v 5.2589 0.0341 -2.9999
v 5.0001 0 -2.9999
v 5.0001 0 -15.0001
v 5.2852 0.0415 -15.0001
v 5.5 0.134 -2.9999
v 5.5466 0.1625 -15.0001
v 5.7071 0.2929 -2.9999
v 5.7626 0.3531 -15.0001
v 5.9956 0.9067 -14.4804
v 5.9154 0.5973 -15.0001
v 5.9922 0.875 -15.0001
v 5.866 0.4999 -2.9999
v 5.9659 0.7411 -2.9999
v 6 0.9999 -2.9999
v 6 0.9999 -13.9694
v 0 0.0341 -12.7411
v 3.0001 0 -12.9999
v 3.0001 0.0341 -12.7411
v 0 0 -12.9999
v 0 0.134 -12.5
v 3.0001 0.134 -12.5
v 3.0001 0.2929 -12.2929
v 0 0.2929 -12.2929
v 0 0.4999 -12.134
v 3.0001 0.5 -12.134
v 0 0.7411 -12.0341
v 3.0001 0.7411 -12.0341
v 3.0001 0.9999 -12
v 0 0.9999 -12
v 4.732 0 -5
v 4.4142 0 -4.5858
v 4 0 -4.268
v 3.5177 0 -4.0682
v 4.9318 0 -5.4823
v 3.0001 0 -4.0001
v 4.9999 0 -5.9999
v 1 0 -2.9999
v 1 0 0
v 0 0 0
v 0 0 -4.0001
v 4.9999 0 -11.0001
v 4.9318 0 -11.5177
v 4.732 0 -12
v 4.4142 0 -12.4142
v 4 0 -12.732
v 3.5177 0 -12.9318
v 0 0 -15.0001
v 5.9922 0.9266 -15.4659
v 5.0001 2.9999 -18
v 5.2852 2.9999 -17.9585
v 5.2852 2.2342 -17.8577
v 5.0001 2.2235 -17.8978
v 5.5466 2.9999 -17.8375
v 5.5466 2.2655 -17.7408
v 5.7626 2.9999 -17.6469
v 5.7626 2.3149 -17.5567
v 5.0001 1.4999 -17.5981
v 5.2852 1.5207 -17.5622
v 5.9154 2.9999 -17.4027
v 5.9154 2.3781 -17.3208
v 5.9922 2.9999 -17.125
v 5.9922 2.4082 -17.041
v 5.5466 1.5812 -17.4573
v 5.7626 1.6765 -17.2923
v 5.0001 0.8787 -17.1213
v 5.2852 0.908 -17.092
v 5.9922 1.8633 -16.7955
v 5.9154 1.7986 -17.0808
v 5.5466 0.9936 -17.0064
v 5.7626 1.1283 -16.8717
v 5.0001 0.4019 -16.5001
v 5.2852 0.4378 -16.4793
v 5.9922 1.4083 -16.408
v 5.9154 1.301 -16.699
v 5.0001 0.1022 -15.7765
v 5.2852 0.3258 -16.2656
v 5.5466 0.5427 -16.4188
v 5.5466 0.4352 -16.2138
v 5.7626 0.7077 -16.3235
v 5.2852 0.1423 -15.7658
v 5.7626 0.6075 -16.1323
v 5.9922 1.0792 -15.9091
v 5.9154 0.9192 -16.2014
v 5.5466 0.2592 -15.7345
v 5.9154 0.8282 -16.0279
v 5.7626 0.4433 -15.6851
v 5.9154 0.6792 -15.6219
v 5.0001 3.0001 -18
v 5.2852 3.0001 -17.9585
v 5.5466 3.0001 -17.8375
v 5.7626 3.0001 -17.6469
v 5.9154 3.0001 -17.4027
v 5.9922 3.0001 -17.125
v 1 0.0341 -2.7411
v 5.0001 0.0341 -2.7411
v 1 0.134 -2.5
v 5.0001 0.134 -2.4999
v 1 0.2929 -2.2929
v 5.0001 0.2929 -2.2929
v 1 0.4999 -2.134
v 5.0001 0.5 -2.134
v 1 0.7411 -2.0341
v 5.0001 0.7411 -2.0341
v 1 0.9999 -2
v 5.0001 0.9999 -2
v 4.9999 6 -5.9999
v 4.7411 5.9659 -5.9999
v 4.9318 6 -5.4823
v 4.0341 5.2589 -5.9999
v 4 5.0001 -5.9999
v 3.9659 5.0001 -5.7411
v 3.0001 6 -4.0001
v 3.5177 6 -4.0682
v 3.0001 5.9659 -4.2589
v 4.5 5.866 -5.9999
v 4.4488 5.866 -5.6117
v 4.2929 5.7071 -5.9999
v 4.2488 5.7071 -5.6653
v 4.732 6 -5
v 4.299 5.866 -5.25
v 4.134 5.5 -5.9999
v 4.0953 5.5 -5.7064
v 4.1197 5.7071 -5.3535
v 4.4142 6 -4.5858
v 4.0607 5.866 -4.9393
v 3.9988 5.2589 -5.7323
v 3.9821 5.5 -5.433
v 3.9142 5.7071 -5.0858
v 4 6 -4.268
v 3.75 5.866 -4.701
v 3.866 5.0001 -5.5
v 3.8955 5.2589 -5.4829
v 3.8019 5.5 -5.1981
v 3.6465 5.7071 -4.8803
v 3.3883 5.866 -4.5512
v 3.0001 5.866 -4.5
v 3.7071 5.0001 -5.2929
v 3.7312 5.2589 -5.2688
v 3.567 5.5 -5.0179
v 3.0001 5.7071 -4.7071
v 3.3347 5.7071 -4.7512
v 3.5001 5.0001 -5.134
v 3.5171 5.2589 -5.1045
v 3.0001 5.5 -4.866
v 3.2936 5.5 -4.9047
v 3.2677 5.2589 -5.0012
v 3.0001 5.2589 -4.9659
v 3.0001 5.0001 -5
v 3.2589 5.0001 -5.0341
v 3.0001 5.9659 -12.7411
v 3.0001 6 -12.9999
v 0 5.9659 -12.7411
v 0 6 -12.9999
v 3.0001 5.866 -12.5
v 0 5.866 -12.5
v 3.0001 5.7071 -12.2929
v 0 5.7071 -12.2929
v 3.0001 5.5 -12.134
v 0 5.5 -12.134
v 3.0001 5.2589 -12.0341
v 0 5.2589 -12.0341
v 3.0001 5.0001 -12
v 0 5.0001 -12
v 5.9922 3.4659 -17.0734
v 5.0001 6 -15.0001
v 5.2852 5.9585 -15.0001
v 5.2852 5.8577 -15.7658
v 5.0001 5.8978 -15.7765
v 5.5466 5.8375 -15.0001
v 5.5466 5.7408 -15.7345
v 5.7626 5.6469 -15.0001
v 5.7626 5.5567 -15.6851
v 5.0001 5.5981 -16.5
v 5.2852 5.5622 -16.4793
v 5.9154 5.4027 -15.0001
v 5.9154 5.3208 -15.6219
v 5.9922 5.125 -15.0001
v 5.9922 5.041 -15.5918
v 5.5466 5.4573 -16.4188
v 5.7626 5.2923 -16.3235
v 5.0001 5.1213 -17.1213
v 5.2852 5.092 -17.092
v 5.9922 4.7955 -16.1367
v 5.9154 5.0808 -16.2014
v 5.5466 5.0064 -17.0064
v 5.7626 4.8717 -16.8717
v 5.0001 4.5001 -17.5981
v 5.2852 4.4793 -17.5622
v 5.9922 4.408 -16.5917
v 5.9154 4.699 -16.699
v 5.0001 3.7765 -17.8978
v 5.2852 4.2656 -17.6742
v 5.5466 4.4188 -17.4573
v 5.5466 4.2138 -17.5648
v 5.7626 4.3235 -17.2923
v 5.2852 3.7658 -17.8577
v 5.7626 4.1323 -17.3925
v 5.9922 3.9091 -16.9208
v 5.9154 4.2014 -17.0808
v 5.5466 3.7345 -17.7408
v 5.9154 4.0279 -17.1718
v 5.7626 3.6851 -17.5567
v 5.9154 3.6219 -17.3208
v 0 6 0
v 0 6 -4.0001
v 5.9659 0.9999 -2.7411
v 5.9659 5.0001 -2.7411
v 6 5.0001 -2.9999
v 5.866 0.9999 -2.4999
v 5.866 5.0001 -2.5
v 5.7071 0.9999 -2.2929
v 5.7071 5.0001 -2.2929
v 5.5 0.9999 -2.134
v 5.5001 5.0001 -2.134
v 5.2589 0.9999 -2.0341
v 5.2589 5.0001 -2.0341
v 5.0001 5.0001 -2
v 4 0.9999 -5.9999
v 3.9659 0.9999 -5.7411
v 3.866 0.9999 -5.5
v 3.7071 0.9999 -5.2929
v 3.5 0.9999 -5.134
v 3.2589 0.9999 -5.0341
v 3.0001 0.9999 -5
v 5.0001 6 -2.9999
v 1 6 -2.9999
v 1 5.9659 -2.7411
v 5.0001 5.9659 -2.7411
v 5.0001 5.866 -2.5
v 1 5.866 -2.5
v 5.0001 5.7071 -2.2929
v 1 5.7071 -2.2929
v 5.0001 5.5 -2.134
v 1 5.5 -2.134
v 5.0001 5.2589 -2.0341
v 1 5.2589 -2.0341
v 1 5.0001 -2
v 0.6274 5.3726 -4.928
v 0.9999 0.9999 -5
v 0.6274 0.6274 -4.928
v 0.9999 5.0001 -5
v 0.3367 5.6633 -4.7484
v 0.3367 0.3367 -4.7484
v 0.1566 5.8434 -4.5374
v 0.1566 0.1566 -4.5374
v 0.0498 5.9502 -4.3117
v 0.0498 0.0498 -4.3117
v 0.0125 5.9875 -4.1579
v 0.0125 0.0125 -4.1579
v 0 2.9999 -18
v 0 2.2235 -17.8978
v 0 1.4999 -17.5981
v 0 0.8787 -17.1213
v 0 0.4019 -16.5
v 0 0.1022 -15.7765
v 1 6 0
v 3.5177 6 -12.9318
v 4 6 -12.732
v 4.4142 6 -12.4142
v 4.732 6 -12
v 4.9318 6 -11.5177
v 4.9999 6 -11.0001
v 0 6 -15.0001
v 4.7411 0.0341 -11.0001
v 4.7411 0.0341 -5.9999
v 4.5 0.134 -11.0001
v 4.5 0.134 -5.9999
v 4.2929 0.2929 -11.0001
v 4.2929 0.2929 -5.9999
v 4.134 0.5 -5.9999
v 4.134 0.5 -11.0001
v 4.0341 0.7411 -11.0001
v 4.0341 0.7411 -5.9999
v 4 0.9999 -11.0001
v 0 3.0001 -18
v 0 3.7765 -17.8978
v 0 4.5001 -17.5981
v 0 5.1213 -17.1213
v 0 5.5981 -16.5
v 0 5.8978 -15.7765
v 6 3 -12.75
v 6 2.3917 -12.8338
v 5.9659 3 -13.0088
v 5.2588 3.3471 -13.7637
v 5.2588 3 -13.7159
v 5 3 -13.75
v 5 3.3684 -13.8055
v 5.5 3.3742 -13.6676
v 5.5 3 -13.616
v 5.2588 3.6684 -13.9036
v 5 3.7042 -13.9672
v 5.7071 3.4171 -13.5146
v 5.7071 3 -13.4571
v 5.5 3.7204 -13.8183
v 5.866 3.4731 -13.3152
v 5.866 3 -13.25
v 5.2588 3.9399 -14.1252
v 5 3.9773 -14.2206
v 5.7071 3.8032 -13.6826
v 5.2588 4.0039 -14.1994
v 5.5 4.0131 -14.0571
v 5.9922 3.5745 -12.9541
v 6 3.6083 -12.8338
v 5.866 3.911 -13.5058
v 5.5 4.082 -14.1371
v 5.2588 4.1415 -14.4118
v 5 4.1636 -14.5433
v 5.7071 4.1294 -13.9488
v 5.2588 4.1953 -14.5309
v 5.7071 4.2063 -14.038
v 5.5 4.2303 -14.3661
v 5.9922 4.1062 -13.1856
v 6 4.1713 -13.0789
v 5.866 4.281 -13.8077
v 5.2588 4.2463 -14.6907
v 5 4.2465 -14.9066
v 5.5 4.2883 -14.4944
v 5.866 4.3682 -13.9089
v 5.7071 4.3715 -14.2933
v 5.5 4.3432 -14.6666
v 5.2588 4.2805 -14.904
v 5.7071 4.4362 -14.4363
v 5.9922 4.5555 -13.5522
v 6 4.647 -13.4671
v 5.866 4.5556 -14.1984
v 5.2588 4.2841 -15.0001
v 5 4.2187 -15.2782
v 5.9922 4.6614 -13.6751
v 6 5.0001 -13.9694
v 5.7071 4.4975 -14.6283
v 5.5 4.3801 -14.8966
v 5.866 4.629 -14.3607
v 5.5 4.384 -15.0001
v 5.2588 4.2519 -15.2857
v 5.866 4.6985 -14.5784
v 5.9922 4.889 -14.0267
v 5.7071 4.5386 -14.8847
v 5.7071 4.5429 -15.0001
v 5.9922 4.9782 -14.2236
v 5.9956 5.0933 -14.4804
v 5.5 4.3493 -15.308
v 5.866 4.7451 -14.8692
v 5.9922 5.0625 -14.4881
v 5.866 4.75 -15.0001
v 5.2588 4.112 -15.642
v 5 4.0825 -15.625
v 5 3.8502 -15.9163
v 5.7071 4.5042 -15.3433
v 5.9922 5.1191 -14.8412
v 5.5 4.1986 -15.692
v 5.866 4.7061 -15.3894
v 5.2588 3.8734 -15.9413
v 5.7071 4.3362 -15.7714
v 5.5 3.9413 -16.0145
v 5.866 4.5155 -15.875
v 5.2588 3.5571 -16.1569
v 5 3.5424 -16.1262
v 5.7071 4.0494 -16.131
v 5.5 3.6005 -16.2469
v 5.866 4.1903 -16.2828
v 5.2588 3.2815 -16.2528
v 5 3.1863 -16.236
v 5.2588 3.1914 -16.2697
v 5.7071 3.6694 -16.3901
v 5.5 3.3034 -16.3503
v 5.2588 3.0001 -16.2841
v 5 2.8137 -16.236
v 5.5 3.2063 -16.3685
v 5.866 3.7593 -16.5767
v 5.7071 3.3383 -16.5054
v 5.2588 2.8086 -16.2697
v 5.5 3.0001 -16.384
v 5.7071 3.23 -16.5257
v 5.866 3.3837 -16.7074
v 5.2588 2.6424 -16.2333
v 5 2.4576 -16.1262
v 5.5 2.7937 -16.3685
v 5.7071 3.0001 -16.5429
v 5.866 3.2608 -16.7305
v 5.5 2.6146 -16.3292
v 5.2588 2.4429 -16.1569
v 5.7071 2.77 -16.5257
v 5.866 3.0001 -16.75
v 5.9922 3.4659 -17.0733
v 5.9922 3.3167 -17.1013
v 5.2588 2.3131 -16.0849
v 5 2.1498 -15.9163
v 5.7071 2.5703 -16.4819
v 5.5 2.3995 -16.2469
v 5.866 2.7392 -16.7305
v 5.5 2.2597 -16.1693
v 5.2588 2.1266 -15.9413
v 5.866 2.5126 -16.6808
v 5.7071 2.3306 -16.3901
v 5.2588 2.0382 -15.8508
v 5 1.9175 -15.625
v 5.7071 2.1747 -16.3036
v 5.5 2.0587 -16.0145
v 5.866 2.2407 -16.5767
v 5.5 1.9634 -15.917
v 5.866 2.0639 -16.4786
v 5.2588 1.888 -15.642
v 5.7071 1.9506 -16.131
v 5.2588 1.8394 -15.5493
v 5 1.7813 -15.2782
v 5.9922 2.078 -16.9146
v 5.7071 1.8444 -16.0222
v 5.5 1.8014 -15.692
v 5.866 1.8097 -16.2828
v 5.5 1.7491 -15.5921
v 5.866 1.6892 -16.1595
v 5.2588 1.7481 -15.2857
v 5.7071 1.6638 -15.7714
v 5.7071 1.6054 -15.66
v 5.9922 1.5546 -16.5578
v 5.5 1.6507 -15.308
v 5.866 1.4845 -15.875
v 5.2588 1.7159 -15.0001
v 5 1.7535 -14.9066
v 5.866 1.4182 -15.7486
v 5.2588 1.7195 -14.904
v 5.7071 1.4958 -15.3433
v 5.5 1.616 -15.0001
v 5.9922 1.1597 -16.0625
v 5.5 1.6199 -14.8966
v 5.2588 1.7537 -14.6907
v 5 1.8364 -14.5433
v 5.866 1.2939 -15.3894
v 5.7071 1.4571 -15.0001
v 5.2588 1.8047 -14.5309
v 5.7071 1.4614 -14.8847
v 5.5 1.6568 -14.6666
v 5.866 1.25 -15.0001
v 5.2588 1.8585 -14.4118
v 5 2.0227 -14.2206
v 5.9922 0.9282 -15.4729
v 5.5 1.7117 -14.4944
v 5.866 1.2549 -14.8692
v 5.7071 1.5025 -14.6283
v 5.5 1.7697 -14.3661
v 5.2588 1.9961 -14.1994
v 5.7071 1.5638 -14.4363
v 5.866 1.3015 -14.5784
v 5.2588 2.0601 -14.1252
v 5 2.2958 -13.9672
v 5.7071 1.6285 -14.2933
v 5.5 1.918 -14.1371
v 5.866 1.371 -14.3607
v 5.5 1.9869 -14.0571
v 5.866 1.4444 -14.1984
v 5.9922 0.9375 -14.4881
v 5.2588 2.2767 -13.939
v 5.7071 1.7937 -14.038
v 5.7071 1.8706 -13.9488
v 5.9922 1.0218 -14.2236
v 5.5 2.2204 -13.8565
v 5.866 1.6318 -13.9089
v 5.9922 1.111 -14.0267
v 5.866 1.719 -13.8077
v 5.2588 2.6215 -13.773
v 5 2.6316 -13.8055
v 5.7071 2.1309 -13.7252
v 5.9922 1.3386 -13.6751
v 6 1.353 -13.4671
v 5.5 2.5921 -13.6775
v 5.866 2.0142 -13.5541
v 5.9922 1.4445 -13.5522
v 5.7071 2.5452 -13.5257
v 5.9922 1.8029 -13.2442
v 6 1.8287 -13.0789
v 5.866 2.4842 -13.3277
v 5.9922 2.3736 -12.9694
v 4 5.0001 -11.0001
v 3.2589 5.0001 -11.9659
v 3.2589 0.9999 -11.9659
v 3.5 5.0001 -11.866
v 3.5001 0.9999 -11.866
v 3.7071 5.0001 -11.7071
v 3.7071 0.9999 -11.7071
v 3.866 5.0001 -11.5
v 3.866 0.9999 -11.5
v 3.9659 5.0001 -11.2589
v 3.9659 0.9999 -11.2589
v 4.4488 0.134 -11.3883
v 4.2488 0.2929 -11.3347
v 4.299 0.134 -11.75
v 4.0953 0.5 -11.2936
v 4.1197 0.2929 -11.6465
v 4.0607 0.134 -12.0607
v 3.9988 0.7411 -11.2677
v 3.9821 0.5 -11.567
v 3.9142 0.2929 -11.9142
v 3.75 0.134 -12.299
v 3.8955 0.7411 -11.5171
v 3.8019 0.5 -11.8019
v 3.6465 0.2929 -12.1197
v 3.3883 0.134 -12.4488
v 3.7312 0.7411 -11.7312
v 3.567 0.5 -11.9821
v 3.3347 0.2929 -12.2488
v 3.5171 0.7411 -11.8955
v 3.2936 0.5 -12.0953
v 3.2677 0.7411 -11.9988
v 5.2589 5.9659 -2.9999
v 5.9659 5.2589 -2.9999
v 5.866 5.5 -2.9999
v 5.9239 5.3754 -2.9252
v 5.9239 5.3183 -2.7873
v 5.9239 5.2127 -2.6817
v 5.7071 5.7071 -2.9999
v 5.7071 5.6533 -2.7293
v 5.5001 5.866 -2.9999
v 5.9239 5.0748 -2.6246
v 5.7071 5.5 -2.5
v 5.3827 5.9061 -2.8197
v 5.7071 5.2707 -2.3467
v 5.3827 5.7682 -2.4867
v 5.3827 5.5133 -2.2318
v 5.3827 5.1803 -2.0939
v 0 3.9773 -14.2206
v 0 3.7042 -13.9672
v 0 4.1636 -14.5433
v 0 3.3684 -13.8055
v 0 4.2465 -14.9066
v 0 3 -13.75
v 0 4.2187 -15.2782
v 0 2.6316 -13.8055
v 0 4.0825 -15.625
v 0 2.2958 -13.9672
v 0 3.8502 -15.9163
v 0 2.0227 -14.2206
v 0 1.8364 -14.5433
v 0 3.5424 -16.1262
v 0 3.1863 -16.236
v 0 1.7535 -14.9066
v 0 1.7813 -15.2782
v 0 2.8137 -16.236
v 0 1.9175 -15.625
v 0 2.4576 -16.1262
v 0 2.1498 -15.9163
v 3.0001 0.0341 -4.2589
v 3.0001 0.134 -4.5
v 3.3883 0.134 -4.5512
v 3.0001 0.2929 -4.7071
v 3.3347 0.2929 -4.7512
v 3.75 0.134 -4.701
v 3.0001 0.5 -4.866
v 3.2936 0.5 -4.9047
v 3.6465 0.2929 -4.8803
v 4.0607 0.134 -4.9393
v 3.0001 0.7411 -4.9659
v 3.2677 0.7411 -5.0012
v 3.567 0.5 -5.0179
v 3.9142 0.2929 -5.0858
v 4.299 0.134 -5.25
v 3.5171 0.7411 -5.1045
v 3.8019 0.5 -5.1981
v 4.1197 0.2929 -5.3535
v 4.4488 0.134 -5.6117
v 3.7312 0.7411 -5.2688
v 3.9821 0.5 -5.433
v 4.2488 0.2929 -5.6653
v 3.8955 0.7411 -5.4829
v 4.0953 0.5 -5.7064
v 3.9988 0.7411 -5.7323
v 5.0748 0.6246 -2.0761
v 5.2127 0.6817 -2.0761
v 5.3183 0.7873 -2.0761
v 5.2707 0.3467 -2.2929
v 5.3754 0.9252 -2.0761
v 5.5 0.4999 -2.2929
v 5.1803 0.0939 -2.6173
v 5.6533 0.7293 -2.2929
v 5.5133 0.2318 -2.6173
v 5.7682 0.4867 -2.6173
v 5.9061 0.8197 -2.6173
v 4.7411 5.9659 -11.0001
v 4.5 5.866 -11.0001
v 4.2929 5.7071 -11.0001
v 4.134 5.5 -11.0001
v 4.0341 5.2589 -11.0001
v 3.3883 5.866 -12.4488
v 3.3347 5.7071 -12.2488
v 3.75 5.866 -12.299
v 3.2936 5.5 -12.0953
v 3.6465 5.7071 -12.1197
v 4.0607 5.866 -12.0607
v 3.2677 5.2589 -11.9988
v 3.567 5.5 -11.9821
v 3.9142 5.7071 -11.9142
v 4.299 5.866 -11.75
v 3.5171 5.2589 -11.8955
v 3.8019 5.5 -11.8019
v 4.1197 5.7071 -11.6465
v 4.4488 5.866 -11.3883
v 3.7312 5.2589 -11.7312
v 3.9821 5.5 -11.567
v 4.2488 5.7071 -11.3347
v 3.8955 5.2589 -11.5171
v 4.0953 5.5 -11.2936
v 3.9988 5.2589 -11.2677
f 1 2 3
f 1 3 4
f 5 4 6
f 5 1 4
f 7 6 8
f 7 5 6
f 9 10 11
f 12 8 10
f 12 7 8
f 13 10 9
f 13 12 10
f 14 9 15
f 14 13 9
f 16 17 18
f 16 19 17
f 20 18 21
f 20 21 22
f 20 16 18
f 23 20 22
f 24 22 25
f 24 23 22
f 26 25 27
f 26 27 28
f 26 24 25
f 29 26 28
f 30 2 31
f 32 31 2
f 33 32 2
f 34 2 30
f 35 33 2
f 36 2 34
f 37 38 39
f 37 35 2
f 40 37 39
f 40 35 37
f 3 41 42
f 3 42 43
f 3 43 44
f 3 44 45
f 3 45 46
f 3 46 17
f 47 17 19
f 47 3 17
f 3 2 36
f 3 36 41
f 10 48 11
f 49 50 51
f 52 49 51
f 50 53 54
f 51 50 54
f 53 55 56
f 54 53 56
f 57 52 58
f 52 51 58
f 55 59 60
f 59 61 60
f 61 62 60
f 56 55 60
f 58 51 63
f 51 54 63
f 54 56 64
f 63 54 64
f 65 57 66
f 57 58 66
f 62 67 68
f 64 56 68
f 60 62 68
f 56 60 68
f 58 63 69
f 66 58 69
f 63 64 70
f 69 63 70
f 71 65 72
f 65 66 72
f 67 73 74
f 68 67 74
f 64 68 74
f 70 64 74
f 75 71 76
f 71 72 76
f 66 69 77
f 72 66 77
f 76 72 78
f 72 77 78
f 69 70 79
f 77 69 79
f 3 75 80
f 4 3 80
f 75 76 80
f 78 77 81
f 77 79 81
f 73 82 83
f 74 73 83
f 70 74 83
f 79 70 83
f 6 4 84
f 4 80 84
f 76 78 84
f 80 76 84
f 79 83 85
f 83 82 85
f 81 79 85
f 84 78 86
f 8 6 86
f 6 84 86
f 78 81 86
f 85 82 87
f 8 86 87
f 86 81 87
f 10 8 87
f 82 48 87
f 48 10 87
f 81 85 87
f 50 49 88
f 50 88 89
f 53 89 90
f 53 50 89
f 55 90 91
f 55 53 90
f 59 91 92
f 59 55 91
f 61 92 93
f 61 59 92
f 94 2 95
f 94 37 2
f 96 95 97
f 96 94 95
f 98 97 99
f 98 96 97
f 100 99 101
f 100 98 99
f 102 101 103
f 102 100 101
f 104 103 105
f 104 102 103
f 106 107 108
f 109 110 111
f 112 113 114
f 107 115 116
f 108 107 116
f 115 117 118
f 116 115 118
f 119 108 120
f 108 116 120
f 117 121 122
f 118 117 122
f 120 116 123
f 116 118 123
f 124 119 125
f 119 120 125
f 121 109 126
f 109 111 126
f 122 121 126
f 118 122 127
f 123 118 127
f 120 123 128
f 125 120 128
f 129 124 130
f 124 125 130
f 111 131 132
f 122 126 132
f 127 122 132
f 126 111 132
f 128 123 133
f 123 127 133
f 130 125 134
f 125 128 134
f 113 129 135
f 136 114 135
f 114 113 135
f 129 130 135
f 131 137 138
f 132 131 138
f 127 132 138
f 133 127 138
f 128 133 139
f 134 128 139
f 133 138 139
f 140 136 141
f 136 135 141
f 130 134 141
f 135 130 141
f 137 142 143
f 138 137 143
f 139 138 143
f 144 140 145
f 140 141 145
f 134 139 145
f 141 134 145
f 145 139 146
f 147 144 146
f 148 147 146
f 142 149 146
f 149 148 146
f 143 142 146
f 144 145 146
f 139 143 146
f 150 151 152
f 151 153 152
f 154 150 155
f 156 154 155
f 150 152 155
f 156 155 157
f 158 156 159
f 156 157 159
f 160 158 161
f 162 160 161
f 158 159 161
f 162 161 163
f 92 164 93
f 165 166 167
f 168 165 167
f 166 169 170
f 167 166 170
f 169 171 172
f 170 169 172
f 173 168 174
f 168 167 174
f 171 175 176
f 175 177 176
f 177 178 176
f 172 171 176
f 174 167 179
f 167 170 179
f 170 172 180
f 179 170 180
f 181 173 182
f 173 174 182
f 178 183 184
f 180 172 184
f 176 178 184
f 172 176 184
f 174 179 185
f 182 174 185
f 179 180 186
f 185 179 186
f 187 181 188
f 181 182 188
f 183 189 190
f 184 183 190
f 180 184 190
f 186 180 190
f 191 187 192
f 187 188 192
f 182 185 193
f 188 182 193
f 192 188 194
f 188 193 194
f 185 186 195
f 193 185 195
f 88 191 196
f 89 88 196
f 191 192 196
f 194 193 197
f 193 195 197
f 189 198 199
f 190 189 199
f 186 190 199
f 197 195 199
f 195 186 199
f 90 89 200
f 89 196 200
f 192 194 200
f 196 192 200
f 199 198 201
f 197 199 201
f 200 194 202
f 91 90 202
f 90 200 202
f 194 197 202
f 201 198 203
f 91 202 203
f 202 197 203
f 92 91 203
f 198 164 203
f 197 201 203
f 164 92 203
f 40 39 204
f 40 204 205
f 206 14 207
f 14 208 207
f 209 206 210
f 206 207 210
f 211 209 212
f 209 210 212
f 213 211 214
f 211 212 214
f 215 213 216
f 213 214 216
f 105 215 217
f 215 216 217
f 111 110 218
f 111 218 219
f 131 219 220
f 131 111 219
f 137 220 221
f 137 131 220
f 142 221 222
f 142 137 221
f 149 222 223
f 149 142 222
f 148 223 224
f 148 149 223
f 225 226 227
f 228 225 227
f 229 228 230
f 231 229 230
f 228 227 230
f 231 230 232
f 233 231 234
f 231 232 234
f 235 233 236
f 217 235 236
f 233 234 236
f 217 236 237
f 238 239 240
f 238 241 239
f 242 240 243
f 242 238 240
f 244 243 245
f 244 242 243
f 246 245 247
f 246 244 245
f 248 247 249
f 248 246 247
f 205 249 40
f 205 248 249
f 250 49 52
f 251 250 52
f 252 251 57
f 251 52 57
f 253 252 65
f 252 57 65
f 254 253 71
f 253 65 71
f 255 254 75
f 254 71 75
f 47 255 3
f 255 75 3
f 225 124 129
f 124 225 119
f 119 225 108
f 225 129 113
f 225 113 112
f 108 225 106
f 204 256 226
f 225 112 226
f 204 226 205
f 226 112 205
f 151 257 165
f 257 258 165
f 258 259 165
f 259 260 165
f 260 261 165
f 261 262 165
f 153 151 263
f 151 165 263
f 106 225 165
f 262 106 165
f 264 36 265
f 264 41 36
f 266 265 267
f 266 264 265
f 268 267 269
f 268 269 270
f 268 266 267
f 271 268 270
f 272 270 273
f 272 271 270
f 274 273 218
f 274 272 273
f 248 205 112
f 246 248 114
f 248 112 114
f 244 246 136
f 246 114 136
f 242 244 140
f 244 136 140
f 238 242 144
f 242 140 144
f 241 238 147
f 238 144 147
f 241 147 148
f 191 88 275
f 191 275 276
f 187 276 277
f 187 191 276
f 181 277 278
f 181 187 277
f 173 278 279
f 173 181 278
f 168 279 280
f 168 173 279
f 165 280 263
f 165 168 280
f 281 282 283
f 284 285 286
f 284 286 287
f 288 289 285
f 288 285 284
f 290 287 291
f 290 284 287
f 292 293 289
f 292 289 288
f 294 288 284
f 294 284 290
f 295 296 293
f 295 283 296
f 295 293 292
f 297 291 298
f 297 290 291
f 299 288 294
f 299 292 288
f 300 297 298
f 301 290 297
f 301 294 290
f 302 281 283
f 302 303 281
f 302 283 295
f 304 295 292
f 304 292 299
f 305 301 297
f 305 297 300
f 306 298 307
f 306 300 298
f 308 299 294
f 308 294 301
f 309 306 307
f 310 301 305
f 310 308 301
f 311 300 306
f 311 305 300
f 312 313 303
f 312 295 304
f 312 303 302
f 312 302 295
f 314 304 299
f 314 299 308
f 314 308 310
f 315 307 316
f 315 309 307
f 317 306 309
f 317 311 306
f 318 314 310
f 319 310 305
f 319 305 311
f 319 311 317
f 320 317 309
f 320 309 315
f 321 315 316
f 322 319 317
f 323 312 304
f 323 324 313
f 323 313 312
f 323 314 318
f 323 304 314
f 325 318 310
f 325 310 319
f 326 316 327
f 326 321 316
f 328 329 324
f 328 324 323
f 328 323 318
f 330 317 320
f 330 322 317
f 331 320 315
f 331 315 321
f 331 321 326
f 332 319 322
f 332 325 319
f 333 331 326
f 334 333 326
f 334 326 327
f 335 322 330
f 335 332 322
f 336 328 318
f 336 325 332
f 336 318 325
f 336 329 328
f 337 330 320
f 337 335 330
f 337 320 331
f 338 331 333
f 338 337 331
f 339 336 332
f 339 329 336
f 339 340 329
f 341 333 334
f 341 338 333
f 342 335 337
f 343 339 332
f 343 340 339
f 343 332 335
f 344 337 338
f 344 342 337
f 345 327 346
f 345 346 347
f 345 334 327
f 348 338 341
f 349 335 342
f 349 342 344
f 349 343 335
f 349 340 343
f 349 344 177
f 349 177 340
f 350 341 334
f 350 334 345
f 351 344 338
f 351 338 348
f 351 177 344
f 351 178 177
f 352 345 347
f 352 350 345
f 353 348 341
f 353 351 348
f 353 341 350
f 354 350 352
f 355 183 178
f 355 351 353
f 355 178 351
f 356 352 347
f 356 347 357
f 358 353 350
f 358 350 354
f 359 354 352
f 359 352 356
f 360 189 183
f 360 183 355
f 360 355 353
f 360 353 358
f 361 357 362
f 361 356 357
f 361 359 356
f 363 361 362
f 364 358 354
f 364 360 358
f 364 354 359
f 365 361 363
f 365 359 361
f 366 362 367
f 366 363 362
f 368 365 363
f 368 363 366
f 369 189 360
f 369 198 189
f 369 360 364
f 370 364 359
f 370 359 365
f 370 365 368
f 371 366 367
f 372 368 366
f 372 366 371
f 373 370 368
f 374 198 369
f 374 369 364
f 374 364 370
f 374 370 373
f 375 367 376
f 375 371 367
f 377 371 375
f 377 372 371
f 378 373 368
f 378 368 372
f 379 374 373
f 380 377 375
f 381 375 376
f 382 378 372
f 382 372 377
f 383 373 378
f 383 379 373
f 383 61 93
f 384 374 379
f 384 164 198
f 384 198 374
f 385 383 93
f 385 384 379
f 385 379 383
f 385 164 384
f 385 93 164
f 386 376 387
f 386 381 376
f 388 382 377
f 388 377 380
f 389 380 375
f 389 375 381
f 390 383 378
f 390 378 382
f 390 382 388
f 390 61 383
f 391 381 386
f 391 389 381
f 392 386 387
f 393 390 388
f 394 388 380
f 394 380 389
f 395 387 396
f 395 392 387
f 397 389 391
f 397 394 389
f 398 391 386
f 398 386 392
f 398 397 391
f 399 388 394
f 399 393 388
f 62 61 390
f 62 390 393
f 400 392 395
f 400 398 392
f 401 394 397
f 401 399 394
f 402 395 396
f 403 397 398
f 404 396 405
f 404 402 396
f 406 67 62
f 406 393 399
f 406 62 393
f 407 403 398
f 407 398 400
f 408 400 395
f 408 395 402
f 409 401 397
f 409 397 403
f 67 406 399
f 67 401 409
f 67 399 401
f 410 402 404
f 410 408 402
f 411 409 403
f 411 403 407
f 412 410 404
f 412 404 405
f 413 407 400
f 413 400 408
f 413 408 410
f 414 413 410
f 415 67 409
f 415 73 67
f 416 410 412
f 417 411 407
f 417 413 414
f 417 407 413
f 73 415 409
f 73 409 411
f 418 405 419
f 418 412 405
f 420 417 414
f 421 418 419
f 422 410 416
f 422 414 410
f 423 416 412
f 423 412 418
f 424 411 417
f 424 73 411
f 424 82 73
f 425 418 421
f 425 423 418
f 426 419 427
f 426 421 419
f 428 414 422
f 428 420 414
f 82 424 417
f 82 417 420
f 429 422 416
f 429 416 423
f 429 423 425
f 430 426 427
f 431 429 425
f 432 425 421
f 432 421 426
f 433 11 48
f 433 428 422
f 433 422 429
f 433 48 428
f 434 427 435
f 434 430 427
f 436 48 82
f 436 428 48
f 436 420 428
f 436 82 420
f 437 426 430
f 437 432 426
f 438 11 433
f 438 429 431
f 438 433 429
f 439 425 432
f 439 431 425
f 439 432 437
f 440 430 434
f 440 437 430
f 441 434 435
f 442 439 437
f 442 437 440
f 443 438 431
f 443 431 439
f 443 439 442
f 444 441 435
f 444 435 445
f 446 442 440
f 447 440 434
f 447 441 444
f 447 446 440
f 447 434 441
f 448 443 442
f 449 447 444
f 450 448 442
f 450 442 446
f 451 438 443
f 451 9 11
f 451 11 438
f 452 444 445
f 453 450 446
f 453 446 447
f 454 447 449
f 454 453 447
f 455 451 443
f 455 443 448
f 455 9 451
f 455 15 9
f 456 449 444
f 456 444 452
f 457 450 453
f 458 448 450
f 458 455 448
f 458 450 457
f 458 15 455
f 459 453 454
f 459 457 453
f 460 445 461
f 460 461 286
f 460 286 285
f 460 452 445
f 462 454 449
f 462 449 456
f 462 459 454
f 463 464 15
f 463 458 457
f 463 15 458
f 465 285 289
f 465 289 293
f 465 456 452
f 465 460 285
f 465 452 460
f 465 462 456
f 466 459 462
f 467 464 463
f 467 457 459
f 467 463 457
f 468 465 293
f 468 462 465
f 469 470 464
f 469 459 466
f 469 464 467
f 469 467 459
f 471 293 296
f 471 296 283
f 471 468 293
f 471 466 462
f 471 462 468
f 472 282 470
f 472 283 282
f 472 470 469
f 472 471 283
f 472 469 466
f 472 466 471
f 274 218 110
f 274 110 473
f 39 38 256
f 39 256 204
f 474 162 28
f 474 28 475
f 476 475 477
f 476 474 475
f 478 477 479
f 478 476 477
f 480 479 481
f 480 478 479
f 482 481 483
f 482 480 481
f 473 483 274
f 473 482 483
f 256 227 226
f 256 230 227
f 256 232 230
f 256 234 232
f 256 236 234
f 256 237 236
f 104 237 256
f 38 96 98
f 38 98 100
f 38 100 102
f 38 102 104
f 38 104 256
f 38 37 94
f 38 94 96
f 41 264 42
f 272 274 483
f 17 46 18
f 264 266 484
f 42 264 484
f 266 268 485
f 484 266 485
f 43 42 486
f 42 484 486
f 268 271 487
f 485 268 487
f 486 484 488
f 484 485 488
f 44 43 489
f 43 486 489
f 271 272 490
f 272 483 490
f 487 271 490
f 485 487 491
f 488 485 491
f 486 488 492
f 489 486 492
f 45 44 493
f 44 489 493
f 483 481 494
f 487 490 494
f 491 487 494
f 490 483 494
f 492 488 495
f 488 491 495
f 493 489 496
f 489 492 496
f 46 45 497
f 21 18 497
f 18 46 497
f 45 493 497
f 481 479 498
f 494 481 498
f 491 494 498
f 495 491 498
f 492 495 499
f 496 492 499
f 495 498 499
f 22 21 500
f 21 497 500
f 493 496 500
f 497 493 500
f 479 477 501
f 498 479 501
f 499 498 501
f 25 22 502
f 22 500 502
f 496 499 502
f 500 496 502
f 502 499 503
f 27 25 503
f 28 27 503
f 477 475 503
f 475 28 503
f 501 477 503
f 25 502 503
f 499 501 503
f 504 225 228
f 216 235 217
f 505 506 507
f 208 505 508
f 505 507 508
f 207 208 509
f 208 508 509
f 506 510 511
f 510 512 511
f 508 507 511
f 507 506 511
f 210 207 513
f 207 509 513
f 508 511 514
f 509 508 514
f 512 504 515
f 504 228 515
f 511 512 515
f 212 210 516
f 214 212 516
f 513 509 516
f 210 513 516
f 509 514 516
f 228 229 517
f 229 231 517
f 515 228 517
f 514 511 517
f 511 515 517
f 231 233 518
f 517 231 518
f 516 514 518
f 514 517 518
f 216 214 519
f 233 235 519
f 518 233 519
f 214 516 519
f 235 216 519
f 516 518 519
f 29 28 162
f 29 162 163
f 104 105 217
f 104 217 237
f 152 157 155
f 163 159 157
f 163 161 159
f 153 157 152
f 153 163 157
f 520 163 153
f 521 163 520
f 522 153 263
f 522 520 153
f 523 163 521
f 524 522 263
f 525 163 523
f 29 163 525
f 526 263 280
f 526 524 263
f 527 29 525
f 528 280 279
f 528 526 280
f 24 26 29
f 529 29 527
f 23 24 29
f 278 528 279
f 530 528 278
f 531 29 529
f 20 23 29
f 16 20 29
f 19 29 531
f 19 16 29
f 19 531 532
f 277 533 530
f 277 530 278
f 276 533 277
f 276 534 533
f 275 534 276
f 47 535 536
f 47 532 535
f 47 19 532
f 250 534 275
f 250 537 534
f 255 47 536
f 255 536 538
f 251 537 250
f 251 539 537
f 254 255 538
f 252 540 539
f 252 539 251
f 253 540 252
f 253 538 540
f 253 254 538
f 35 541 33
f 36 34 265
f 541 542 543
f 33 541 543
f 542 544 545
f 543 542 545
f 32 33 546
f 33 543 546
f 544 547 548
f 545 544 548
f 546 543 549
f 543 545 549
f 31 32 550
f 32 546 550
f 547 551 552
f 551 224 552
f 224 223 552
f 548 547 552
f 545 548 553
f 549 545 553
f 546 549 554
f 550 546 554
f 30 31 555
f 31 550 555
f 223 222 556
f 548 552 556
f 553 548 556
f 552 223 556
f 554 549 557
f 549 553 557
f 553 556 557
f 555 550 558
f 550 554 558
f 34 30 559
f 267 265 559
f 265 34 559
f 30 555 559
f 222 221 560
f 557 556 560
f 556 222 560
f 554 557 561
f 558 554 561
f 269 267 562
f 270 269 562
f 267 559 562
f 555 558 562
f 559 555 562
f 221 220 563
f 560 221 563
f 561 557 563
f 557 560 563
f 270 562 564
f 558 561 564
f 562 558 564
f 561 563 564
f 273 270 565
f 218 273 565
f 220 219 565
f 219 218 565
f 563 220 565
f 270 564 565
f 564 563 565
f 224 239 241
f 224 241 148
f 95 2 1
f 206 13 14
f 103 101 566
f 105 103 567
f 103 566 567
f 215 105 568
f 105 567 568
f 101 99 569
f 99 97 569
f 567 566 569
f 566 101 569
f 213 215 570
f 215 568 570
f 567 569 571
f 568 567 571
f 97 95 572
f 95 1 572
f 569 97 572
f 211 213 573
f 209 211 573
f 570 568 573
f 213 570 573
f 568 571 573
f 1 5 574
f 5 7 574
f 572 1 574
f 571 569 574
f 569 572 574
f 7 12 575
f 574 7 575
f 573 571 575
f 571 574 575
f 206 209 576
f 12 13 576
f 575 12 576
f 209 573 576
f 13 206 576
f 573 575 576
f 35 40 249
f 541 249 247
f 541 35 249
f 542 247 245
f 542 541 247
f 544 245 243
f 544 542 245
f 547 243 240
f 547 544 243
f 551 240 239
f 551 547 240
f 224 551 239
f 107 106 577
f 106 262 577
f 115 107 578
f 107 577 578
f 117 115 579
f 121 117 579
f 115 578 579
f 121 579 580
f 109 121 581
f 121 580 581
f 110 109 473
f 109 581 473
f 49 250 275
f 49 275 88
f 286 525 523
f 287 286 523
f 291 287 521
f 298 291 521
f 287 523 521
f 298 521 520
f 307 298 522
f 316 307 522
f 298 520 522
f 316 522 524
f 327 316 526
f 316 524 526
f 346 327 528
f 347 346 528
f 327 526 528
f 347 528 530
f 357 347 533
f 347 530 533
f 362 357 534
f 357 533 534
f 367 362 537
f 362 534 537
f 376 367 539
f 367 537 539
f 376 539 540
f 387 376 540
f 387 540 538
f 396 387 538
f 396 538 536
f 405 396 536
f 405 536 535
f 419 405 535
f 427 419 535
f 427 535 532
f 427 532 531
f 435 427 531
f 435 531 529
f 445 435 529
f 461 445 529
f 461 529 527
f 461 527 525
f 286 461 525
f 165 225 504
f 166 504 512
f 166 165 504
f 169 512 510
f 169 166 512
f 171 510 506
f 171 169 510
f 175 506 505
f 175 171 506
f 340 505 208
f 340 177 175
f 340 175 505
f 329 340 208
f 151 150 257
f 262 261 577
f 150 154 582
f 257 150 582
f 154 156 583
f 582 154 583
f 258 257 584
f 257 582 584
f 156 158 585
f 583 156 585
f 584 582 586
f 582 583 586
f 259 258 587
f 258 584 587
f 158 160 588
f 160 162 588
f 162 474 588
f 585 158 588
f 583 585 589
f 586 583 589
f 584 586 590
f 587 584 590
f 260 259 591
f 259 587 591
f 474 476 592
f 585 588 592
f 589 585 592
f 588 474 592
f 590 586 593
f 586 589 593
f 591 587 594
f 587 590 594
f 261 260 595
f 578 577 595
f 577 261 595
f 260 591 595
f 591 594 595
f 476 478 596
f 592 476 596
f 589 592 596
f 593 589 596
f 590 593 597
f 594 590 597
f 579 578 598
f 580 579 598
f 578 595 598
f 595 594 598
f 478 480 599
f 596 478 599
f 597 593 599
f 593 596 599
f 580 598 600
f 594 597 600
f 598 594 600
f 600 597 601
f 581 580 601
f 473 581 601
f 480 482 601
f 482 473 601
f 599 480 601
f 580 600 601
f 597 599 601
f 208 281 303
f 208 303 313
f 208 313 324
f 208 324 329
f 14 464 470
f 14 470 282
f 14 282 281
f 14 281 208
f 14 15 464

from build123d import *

# Parameters (mm, degrees)
EXTRUDE_1_DEPTH     = 6
FILLET_1_R          = 3
FILLET_2_R          = 1
SKETCH_2_R          = 1.25
CUT_EXTRUDE_1_DEPTH = 20.899748742
FILLET_3_R          = 1


# Some blends are built 0.0001 mm under size
with BuildPart() as part:
    # Эскиз1 → Бобышка-Вытянуть1 (new body)
    with BuildSketch(Plane(origin=(0, 0, 0), x_dir=(1, 0, 0), z_dir=(0, 1, 0))):
        Polygon((0, 0), (0, 5), (4, 5), (4, 12), (0, 12), (0, 18), (6, 18), (6, 2), (1, 2), (1, 0), align=None)
    extrude(amount=EXTRUDE_1_DEPTH)

    # Скругление1
    fillet_1_edges = [part.edges().sort_by_distance(p)[0] for p in [
        (3, 0, -18),
        (3, 6, -18),
    ]]
    fillet(fillet_1_edges, radius=FILLET_1_R - 0.0001)  # a hair under: the kernel refuses the full size

    # Скругление2
    fillet_2_edges = [part.edges().sort_by_distance(p)[0] for p in [
        (3.5, 6, -2),
        (4, 0, -8.5),
        (2, 0, -12),
        (6, 0, -8.50005),
        (3.5, 0, -2),
        (6, 6, -8.50005),
        (0, 3, -5),
        (4, 3, -5),
        (4, 3, -12),
        (6, 3, -2),
        (2, 6, -12),
        (4, 6, -8.5),
        (2, 6, -5),
        (6, 5.121349633, -17.121349633),
        (6, 0.878650367, -17.121349633),
        (2, 0, -5),
    ]]
    fillet(fillet_2_edges, radius=FILLET_2_R - 0.0001)  # a hair under: the kernel refuses the full size

    # Эскиз2 → Вырез-Вытянуть1 (cut, through all)
    with BuildSketch(Plane.ZY):
        with Locations((-15, 3)):
            Circle(SKETCH_2_R)
    extrude(amount=-CUT_EXTRUDE_1_DEPTH, mode=Mode.SUBTRACT)

    # Скругление3
    # the kernel refuses this fillet: 1 mm, written as the material it takes off along each edge
    with BuildSketch(Plane(origin=(6, 3, -15), x_dir=(0, 0, 1), z_dir=(0, -1, 0))) as fillet_3_piece_1:
        with BuildLine():
            CenterArc((1.25 + FILLET_3_R, FILLET_3_R), FILLET_3_R, 180, 90)
            Line((1.25 + FILLET_3_R, 0), (1.25, 0))
            Line((1.25, 0), (1.25, FILLET_3_R))
        make_face()
    revolve(axis=Axis((6, 3, -15), (-1, 0, 0)), mode=Mode.SUBTRACT)


solid = part.part
